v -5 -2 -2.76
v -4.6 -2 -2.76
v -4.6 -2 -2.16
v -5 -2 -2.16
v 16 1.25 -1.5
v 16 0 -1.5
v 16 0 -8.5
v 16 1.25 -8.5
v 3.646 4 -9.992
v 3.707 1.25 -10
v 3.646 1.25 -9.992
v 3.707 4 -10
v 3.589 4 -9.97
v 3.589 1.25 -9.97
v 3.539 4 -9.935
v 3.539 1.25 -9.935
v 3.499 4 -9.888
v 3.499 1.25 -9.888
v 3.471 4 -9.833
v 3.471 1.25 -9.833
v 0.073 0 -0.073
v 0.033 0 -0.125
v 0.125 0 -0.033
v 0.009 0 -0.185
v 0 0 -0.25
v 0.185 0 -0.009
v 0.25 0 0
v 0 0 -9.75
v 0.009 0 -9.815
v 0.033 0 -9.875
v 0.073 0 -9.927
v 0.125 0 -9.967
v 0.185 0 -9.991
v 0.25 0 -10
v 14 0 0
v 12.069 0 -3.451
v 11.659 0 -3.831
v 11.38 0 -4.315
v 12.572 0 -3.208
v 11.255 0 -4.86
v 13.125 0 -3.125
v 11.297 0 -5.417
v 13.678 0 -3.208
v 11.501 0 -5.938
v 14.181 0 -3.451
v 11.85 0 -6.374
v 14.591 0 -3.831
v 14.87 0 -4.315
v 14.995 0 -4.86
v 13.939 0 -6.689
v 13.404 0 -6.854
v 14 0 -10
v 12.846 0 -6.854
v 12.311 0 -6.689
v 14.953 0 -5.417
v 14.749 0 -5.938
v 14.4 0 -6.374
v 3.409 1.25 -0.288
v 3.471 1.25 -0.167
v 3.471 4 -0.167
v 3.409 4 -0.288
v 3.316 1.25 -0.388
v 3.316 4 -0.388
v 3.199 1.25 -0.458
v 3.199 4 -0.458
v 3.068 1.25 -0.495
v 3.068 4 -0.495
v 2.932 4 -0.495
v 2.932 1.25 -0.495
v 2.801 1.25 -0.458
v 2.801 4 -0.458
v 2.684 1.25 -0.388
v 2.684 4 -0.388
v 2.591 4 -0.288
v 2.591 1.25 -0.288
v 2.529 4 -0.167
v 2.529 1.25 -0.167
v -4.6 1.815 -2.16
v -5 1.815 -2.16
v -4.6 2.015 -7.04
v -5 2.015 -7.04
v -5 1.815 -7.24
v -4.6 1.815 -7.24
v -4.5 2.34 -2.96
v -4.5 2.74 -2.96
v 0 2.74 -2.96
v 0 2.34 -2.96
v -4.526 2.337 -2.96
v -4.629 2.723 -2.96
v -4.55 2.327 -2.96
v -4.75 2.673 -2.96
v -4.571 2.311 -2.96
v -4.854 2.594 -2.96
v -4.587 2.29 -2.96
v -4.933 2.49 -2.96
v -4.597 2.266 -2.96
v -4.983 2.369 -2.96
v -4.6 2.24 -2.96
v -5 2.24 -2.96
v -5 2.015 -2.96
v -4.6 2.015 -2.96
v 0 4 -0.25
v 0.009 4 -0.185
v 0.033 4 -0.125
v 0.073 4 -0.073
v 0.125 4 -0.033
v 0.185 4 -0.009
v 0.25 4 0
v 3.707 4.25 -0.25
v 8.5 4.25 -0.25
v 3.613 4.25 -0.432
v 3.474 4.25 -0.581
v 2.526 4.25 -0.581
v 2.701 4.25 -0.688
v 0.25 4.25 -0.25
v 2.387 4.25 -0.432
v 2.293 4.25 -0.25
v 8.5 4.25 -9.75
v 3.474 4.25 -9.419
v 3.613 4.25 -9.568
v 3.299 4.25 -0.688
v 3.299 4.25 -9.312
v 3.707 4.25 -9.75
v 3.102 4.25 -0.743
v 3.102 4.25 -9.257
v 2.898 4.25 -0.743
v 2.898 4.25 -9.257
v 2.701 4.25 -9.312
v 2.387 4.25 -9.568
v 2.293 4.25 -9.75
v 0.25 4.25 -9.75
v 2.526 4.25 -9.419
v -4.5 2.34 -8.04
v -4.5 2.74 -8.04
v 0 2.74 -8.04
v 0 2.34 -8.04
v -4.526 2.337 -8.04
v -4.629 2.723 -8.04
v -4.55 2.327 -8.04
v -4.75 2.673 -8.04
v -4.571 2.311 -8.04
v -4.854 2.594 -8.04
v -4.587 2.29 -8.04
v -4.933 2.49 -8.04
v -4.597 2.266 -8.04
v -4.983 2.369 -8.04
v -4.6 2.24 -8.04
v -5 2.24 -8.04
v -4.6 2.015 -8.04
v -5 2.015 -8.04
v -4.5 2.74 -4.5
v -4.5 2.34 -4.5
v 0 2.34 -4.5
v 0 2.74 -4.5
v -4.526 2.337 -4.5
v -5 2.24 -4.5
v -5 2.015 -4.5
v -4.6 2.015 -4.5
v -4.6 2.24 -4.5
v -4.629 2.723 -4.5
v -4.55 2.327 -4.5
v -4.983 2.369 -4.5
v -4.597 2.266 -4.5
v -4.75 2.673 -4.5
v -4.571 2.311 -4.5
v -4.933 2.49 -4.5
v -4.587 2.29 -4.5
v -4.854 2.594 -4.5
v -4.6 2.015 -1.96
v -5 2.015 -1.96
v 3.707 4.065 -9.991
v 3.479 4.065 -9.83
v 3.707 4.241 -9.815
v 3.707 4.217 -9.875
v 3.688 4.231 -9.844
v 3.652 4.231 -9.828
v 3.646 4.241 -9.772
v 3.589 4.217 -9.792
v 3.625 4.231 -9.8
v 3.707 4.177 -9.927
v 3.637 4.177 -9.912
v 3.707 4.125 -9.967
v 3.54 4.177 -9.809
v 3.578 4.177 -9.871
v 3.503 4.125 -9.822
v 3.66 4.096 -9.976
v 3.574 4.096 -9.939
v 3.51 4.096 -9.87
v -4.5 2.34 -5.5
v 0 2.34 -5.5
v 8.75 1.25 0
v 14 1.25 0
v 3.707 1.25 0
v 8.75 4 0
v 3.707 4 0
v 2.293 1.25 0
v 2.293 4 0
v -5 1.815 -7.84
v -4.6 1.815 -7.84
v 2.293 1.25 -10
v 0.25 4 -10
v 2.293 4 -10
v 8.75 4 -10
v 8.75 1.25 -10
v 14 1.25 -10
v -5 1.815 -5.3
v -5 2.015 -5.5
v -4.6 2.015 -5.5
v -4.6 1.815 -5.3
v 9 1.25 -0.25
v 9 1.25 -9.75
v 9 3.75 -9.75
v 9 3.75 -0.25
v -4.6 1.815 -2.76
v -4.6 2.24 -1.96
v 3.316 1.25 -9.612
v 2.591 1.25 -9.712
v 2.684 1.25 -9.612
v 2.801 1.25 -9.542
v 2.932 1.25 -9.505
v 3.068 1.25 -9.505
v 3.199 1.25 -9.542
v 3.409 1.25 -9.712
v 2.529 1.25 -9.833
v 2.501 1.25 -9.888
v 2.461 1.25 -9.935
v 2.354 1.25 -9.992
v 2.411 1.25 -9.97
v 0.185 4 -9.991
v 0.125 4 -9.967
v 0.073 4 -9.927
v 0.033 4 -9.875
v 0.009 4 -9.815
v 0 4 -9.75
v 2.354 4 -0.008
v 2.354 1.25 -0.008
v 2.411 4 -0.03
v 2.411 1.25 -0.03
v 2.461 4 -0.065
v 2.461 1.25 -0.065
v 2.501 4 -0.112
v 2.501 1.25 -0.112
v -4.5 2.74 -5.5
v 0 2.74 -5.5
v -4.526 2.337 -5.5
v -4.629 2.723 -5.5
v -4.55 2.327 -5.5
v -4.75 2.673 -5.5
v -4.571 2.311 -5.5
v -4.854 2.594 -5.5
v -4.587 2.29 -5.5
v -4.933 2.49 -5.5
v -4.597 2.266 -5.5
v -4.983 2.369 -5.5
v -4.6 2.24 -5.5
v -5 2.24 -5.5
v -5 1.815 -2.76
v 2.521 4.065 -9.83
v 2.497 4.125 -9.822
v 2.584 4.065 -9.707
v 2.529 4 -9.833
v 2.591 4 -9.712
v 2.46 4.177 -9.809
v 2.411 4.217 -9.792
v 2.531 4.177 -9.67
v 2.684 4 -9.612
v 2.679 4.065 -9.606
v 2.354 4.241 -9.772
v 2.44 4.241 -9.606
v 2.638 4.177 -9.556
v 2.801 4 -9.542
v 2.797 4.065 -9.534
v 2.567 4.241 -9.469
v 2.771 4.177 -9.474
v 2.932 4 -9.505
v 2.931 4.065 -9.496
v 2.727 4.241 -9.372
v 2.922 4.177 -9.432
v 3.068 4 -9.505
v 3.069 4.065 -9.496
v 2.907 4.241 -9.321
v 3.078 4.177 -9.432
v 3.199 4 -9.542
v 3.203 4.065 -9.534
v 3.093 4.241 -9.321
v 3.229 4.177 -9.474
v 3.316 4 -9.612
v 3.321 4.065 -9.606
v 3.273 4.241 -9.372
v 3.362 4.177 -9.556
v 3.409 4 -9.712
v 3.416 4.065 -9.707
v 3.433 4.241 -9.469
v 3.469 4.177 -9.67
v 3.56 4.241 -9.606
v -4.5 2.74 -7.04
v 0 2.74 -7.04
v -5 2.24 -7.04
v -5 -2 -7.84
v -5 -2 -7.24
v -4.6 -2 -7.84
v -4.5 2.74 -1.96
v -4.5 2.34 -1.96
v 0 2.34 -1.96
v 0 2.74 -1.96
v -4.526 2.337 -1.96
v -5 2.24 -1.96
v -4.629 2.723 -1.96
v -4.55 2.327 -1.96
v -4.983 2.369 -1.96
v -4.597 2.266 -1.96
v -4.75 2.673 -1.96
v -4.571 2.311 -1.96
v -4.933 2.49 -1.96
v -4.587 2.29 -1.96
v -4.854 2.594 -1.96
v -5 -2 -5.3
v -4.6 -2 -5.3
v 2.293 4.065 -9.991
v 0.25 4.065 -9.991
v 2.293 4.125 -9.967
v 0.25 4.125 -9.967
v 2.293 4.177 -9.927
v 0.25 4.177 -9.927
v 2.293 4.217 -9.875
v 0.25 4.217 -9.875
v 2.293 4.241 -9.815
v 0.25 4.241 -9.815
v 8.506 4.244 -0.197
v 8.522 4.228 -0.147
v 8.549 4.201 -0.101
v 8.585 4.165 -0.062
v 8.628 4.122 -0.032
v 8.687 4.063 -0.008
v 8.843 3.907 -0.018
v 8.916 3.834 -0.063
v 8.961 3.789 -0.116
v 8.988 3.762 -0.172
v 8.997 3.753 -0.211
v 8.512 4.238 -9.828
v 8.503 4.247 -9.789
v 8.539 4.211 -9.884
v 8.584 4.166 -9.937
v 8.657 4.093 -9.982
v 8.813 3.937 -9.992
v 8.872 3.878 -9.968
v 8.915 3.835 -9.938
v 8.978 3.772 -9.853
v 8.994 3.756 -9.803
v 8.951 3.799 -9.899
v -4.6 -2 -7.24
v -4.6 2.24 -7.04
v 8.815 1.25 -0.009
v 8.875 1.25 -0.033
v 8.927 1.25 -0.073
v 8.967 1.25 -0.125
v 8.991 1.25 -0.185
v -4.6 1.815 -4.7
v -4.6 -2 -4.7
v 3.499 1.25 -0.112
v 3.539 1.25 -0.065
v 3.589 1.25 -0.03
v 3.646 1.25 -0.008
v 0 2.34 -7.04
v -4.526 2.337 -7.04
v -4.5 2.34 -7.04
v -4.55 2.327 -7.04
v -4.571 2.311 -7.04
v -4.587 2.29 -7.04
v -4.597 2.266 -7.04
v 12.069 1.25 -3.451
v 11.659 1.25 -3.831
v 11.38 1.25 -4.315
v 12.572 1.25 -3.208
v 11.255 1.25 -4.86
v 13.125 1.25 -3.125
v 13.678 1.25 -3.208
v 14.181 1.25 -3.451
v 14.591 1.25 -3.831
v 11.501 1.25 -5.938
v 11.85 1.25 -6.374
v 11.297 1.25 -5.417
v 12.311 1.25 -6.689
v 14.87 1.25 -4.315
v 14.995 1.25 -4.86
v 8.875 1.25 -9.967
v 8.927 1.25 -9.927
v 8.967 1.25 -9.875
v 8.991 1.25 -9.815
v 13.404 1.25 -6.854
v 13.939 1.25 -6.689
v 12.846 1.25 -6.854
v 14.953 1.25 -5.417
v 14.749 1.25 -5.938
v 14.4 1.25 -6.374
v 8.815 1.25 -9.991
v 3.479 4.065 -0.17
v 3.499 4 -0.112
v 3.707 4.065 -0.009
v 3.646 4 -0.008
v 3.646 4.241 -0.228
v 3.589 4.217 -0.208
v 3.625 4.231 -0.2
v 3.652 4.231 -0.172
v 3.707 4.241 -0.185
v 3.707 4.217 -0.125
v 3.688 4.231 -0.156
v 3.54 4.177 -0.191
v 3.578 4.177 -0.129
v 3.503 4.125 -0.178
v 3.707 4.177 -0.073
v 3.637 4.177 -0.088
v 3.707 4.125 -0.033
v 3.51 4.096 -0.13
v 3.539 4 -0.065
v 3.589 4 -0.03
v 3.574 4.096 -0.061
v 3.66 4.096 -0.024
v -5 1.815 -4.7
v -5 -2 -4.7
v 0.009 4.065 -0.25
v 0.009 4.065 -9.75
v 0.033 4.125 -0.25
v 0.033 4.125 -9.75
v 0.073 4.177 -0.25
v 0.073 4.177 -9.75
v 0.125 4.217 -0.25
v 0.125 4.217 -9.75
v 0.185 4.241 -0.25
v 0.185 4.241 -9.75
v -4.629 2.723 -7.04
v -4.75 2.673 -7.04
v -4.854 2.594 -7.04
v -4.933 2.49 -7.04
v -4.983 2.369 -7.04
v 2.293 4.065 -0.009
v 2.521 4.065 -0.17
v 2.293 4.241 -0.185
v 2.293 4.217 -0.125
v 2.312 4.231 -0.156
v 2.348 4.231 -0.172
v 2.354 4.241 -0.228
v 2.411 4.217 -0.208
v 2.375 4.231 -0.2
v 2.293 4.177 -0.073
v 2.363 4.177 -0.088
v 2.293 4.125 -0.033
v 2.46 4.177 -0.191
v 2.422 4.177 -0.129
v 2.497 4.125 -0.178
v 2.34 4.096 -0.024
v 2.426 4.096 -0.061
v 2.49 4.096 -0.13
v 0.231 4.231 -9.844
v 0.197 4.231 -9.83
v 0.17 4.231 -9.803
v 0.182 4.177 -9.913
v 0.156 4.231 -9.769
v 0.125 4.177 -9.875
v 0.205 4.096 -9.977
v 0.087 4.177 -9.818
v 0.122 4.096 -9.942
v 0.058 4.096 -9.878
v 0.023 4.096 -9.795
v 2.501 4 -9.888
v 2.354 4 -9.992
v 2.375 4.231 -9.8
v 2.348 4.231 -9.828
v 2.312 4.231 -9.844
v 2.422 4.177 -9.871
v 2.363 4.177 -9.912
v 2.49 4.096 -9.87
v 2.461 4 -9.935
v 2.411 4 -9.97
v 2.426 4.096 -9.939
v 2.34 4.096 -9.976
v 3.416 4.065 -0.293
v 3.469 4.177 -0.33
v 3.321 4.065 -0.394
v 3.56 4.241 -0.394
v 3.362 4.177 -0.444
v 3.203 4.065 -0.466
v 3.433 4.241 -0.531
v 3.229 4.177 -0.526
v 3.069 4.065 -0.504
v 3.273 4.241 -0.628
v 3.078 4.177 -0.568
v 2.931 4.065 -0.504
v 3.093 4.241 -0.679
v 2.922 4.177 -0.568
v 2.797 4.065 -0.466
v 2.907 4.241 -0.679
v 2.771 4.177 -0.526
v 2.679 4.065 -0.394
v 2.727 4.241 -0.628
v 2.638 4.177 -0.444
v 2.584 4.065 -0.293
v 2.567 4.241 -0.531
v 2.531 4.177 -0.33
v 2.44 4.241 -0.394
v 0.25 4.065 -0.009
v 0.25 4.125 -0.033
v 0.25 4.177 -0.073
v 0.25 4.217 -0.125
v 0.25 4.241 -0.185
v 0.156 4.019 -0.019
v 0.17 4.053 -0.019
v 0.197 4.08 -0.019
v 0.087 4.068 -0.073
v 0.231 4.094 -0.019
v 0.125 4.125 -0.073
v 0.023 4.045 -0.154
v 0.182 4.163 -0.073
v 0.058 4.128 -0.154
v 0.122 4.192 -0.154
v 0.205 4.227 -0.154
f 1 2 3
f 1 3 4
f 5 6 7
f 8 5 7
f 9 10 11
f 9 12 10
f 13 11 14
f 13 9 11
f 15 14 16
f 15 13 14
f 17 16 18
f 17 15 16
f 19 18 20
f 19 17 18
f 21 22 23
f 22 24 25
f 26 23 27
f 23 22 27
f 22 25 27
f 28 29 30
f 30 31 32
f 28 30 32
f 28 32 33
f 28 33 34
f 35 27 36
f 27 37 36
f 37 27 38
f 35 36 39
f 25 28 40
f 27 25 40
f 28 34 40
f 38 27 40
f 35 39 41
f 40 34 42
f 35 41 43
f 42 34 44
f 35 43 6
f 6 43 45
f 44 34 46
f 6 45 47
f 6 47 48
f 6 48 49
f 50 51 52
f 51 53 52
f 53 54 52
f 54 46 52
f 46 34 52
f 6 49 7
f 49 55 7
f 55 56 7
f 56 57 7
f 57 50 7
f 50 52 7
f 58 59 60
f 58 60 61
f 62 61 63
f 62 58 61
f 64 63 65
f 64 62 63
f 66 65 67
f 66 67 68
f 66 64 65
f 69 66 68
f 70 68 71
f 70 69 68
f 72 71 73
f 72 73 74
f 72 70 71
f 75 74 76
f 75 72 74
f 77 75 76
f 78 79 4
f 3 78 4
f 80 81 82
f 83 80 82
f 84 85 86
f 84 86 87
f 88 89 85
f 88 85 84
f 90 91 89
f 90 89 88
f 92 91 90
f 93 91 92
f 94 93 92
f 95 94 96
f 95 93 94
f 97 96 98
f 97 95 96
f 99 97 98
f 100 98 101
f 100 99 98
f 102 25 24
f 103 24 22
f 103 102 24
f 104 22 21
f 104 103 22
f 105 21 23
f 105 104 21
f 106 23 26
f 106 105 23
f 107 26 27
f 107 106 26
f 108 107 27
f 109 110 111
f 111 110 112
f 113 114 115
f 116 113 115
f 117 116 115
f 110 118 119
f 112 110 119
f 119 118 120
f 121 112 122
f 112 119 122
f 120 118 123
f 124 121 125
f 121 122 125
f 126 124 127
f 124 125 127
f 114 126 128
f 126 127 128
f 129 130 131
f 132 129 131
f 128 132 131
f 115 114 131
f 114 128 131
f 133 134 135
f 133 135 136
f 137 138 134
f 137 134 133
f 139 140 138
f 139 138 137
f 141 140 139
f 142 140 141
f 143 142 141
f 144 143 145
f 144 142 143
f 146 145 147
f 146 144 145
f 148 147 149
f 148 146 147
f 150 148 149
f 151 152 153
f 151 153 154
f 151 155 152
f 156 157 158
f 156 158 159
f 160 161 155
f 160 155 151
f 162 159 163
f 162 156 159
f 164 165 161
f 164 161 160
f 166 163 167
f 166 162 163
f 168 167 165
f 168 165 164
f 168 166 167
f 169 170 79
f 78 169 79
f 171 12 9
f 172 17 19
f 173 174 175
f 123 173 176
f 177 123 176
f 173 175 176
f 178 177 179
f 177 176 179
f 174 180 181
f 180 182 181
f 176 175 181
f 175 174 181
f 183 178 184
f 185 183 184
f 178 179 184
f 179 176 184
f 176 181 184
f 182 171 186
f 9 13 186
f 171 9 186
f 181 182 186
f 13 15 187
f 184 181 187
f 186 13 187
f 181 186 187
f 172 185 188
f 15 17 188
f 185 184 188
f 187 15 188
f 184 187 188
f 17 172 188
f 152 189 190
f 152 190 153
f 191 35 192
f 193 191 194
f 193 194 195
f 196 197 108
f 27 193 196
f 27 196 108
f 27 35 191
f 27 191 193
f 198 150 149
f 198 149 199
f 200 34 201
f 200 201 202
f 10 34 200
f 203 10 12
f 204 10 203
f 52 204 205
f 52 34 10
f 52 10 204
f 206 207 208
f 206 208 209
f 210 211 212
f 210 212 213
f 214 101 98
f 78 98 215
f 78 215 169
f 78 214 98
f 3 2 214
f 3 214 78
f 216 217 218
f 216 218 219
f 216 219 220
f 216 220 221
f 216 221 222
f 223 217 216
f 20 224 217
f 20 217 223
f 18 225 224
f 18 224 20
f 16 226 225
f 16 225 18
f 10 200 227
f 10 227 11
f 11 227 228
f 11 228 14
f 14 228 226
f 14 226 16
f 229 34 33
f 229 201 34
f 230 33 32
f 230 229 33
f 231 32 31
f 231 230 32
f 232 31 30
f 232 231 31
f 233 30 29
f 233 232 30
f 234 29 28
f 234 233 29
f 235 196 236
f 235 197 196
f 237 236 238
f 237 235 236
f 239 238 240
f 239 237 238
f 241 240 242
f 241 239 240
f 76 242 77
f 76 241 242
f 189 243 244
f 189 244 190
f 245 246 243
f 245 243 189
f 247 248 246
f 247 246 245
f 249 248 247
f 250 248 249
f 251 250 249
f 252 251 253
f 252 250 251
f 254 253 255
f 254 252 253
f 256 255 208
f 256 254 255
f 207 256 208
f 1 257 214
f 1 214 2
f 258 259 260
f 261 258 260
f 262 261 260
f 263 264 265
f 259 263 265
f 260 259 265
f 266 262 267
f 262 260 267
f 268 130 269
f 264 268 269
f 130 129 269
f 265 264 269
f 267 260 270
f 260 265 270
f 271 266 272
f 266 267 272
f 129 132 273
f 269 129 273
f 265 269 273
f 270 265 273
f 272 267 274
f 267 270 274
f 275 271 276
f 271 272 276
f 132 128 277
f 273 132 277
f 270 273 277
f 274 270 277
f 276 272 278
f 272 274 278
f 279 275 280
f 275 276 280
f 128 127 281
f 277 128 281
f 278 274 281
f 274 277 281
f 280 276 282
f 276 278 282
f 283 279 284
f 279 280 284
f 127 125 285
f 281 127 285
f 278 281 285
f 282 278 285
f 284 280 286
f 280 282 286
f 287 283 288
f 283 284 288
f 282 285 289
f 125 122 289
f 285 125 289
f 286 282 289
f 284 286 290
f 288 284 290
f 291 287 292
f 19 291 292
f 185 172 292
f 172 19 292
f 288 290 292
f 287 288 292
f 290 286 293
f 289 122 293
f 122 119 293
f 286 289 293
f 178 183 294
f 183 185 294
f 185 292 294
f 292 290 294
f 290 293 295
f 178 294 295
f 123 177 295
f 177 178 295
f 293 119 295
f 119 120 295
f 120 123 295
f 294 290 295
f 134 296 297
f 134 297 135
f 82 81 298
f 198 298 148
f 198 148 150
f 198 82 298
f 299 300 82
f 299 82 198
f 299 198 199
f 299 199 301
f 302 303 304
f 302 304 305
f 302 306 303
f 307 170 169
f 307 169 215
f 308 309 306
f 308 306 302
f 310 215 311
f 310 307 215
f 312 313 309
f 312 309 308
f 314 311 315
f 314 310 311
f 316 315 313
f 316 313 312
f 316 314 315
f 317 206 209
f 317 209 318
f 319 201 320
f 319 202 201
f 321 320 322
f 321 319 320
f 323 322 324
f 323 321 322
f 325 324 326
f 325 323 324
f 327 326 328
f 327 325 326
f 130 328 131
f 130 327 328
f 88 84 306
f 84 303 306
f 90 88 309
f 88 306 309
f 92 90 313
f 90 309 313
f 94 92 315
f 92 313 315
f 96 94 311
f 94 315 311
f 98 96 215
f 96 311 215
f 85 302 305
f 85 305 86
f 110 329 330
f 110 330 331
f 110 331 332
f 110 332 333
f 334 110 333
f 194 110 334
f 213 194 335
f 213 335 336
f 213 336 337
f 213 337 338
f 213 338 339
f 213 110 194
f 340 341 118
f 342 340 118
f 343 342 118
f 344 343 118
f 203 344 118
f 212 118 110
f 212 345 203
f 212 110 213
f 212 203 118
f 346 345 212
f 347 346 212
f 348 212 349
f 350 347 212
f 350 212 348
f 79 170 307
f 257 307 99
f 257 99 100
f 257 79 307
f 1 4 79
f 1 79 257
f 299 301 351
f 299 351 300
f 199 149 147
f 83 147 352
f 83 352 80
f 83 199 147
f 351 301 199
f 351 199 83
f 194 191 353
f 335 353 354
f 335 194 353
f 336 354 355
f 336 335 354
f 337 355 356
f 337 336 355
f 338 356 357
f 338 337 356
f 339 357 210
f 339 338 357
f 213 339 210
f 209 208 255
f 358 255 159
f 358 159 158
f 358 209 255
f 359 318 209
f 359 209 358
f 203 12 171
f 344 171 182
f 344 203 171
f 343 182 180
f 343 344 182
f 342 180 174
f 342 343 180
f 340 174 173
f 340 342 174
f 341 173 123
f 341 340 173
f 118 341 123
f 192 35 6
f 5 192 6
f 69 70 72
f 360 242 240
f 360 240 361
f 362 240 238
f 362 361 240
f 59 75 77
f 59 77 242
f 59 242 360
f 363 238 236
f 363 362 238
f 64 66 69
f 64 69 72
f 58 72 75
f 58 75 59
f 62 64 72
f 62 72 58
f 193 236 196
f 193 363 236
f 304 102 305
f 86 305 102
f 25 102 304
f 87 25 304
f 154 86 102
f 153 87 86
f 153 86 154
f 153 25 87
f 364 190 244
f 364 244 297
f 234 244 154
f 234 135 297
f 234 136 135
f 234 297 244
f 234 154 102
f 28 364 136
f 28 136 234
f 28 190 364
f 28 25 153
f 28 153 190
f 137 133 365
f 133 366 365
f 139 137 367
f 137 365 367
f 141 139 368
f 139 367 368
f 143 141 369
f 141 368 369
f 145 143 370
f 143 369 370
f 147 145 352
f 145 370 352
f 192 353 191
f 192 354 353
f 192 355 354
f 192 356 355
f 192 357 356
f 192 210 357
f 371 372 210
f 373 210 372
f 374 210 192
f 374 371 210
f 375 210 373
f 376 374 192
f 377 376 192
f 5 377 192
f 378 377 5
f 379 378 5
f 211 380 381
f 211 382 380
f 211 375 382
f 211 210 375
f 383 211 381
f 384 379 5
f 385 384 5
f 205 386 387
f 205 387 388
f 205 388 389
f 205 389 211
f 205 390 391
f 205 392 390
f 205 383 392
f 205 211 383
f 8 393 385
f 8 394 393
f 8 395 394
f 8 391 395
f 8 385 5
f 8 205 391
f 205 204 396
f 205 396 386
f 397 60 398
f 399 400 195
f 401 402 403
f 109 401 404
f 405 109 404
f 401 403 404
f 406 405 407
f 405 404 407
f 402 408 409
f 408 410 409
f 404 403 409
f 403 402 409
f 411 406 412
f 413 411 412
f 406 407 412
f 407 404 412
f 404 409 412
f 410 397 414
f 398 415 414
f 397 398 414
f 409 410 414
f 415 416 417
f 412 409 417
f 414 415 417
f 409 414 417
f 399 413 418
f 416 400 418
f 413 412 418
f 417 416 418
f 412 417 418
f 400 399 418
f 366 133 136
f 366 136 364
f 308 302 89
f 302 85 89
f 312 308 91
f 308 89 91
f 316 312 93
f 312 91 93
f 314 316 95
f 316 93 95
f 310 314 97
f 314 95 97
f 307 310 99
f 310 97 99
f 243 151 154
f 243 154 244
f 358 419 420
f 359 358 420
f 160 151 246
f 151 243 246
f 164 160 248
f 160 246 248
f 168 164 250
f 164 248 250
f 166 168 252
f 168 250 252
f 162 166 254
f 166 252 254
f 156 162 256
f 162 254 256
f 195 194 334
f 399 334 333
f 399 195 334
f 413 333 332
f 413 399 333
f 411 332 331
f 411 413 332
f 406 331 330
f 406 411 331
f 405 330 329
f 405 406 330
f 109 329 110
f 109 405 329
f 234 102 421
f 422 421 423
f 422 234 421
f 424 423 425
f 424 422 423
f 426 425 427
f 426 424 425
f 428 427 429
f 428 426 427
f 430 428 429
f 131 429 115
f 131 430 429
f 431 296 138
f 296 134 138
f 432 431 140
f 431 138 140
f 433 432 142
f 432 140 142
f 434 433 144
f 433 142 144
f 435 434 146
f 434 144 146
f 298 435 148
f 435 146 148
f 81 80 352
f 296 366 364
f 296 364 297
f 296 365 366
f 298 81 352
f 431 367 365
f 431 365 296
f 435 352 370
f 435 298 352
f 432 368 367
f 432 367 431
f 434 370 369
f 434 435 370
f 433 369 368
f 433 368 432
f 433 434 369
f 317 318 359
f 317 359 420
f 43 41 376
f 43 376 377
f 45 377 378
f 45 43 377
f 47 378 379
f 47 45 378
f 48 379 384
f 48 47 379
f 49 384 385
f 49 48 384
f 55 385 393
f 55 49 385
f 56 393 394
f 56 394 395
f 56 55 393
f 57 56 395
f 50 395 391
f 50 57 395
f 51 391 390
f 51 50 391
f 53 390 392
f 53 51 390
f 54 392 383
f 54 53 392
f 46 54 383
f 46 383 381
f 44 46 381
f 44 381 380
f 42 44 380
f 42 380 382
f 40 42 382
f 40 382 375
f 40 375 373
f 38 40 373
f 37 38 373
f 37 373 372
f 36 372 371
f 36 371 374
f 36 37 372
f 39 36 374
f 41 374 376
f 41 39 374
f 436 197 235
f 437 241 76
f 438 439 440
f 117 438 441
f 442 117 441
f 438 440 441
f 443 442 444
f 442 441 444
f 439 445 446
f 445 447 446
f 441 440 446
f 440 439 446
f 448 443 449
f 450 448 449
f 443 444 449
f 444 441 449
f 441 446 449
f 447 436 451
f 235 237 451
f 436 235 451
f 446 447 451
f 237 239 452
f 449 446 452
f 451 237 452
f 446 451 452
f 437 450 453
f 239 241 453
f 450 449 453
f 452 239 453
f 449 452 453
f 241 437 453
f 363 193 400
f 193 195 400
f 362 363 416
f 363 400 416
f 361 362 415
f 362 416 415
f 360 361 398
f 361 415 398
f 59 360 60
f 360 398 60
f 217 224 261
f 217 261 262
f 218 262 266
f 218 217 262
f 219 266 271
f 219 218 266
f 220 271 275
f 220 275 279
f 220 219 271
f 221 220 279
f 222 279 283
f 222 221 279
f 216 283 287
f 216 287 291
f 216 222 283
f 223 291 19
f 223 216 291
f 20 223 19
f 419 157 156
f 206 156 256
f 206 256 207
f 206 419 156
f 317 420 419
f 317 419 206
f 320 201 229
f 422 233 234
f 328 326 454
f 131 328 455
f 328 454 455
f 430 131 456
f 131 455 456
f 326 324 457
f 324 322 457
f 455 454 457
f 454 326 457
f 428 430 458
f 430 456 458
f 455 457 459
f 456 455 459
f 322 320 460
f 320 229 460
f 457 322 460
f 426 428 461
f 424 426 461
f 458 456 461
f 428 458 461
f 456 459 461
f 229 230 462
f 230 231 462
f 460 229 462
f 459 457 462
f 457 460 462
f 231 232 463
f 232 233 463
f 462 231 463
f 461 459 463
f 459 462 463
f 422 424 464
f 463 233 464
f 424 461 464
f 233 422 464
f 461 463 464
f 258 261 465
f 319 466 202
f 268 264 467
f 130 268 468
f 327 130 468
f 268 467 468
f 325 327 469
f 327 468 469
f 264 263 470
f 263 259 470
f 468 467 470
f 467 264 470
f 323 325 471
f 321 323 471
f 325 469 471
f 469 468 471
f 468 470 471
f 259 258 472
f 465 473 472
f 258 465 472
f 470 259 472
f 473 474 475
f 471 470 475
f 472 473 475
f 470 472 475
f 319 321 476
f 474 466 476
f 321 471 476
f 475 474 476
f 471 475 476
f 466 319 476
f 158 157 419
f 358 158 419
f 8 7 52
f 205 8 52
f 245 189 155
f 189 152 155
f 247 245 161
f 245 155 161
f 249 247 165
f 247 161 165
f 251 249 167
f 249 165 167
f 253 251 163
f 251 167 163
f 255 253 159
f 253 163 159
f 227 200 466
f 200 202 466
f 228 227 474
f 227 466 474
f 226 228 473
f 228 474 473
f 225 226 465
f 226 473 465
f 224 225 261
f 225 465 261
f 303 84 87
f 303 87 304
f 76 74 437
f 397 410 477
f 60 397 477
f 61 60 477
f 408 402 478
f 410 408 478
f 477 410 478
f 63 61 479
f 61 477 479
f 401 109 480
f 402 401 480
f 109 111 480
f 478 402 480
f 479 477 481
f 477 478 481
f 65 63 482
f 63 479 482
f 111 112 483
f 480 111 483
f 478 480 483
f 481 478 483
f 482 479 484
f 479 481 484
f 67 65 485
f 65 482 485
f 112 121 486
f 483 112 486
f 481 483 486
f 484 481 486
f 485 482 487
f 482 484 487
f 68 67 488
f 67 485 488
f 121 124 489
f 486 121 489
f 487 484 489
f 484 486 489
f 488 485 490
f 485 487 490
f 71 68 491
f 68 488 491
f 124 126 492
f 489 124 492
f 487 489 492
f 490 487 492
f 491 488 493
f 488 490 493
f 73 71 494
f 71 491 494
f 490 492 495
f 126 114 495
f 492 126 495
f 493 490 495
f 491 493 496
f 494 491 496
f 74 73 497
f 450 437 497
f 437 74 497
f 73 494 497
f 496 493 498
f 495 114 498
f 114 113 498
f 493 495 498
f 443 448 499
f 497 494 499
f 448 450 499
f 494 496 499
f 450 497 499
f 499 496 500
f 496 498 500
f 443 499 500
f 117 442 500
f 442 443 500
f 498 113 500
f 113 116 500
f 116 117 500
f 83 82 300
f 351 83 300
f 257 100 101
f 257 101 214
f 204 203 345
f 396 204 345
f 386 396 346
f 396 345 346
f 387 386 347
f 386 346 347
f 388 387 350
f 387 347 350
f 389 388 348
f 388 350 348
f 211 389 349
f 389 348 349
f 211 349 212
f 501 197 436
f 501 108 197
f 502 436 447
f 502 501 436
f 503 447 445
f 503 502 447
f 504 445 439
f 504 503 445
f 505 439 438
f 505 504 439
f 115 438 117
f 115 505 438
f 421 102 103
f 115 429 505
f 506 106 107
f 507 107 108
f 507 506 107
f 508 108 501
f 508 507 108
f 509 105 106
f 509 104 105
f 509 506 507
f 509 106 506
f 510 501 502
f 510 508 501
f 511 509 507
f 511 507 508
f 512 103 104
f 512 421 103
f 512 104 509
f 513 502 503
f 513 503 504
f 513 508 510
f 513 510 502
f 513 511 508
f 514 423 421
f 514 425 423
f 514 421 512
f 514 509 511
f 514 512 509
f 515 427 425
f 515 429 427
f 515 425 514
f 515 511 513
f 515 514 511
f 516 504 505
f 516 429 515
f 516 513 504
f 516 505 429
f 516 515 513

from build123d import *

# Parameters (mm, degrees)
SKETCH_1_R               = 1.875
EXTRUDE_1_DEPTH          = 1.25
EXTRUDE_2_DEPTH          = 3
FILLET_1_R               = 0.25
CHAMFER_1_SIZE           = 0.5
SKETCH_3_W               = 0.999690432
SKETCH_3_H               = 0.4
CUT_EXTRUDE_1_REACH      = 25.645
PATTERN_LINEAR_1_COUNT   = 2
PATTERN_LINEAR_1_PITCH   = 2.54
MIRROR_1_COPY_1_SKETCH_W = 0.999690432
MIRROR_1_COPY_1_SKETCH_H = 0.4
MIRROR_1_COPY_2_REACH    = 25.645


with BuildPart() as part:
    # 草图1 → 凸台-拉伸1 (new body)
    with BuildSketch(Plane(origin=(0, 0, 0), x_dir=(1, 0, 0), z_dir=(0, 1, 0))):
        Polygon((0, 0), (14, 0), (16, 1.5), (16, 8.5), (14, 10), (0, 10), align=None)
        with Locations(Location((13.125, 5, 0), (0, 0, 270))):
            Circle(SKETCH_1_R, mode=Mode.SUBTRACT)
    extrude(amount=EXTRUDE_1_DEPTH)

    # 草图2 → 凸台-拉伸2 (add)
    with BuildSketch(Plane(origin=(0, 1.25, 0), x_dir=(1, 0, 0), z_dir=(0, 1, 0))):
        with BuildLine():
            Line((0, 10), (2.5, 10))
            ThreePointArc((2.5, 10), (3, 9.5), (3.5, 10))
            Line((3.5, 10), (9, 10))
            Line((9, 10), (9, 0))
            Line((9, 0), (3.5, 0))
            ThreePointArc((3.5, 0), (3, 0.5), (2.5, 0))
            Line((2.5, 0), (0, 0))
            Line((0, 0), (0, 10))
        make_face()
    extrude(amount=EXTRUDE_2_DEPTH)

    # 圆角1
    fillet_1_edges = [part.edges().sort_by_distance(p)[0] for p in [
        (0, 2.125, -10),
        (2.5, 2.75, -10),
        (3.5, 2.75, -10),
        (6.25, 4.25, -10),
        (3, 4.25, -9.5),
        (1.25, 4.25, -10),
        (0, 4.25, -5),
        (0, 2.125, 0),
        (3.5, 2.75, 0),
        (2.5, 2.75, 0),
        (1.25, 4.25, 0),
        (3, 4.25, -0.5),
        (6.25, 4.25, 0),
        (9, 2.75, -10),
        (9, 2.75, 0),
    ]]
    fillet(fillet_1_edges, radius=FILLET_1_R)

    # 倒角1
    # the kernel refuses this chamfer: 0.5 mm, written as the material it takes off along each edge
    with BuildSketch(Plane(origin=(9, 4.25, -11.035841494), x_dir=(-0.9996219169112968, 0.027495876610585647, 0), z_dir=(0, 0, 1))) as chamfer_1_piece_1:
        Polygon((CHAMFER_1_SIZE * 0.999621916911, CHAMFER_1_SIZE * 0.0274958766106), (-CHAMFER_1_SIZE * 0.0274958766106, CHAMFER_1_SIZE * 0.999621916911), (0, 0), align=None)
    extrude(amount=12.071682988, mode=Mode.SUBTRACT)

    # 扫描1: sweep along a path in 草图4
    with BuildLine(Plane(origin=(0, 0, -5), x_dir=(-1, 0, 0), z_dir=(0, 0, -1))) as sweep_1_path:
        Line((0, 2.74), (4.5, 2.74))
        ThreePointArc((4.5, 2.74), (4.853553391, 2.593553391), (5, 2.24))
        Line((5, 2.24), (5, -2))
    # 草图3 → 扫描1 (sweep)
    with BuildSketch(Plane.ZY):
        with Locations((-5, 2.54)):
            Rectangle(SKETCH_3_W, SKETCH_3_H)
    sweep_1 = sweep(path=sweep_1_path.line)

    # 草图5 → 切除-拉伸1 (cut, up to next)
    with BuildSketch(Plane.ZY.offset(5), mode=Mode.PRIVATE) as cut_extrude_1_sk1:
        Polygon((-4.7, 1.814659855), (-4.7, -2), (-4.500154784, -2), (-4.500154784, 2.014505072), align=None)
    cut_extrude_1_tool1 = extrude(cut_extrude_1_sk1.sketch, amount=-CUT_EXTRUDE_1_REACH, mode=Mode.PRIVATE) & part.part
    # 草图5 → 切除-拉伸1 (cut, up to next)
    with BuildSketch(Plane.ZY.offset(5), mode=Mode.PRIVATE) as cut_extrude_1_sk2:
        Polygon((-5.3, 1.814659855), (-5.3, -2), (-5.499845216, -2), (-5.499845216, 2.014505072), align=None)
    cut_extrude_1_tool2 = extrude(cut_extrude_1_sk2.sketch, amount=-CUT_EXTRUDE_1_REACH, mode=Mode.PRIVATE) & part.part
    cut_extrude_1_1 = cut_extrude_1_tool1.solids().sort_by_distance((-5, -0.042284, -4.599227))[0]
    add(cut_extrude_1_1, mode=Mode.SUBTRACT)
    cut_extrude_1_2 = cut_extrude_1_tool2.solids().sort_by_distance((-5, -0.042284, -5.400773))[0]
    add(cut_extrude_1_2, mode=Mode.SUBTRACT)
    cut_extrude_1 = cut_extrude_1_1 + cut_extrude_1_2  # 切除-拉伸1 as one shape, for the pattern or mirror that repeats it

    # 阵列(线性)1: 扫描1, 切除-拉伸1 ×2
    with Locations(*[(0, 0, i * PATTERN_LINEAR_1_PITCH) for i in range(1, PATTERN_LINEAR_1_COUNT)]):
        add(sweep_1)
        add(cut_extrude_1, mode=Mode.SUBTRACT)

    # 镜向1: 扫描1, 切除-拉伸1 across plane
    add(sweep_1.mirror(Plane(origin=(0, 0, -5), x_dir=(1, 0, 0), z_dir=(0, 0, -1))))
    add(cut_extrude_1.mirror(Plane(origin=(0, 0, -5), x_dir=(1, 0, 0), z_dir=(0, 0, -1))), mode=Mode.SUBTRACT)

    # 镜向1 copy 1: sweep along a path in 镜向1 copy 1 path
    with BuildLine(Plane(origin=(0, 0, -7.54), x_dir=(-1, 0, 0), z_dir=(0, 0, 1))) as mirror_1_copy_1_path:
        Line((0, -2.74), (4.5, -2.74))
        ThreePointArc((4.5, -2.74), (4.853553391, -2.593553391), (5, -2.24))
        Line((5, -2.24), (5, 2))
    # 镜向1 copy 1 sketch → 镜向1 copy 1 (sweep)
    with BuildSketch(Plane(origin=(0, 0, -12.54), x_dir=(0, 0, -1), z_dir=(-1, 0, 0))):
        with Locations((-5, -2.54)):
            Rectangle(MIRROR_1_COPY_1_SKETCH_W, MIRROR_1_COPY_1_SKETCH_H)
    sweep(path=mirror_1_copy_1_path.line)

    # 镜向1 copy 2 sketch → 镜向1 copy 2 (cut, up to next)
    with BuildSketch(Plane(origin=(-5, 0, -12.54), x_dir=(0, 0, -1), z_dir=(-1, 0, 0)), mode=Mode.PRIVATE) as mirror_1_copy_2_sk1:
        Polygon((-4.7, -1.814659855), (-4.7, 2), (-4.500154784, 2), (-4.500154784, -2.014505072), align=None)
    mirror_1_copy_2_tool1 = extrude(mirror_1_copy_2_sk1.sketch, amount=-MIRROR_1_COPY_2_REACH, mode=Mode.PRIVATE) & part.part
    # 镜向1 copy 2 sketch → 镜向1 copy 2 (cut, up to next)
    with BuildSketch(Plane(origin=(-5, 0, -12.54), x_dir=(0, 0, -1), z_dir=(-1, 0, 0)), mode=Mode.PRIVATE) as mirror_1_copy_2_sk2:
        Polygon((-5.3, -1.814659855), (-5.3, 2), (-5.499845216, 2), (-5.499845216, -2.014505072), align=None)
    mirror_1_copy_2_tool2 = extrude(mirror_1_copy_2_sk2.sketch, amount=-MIRROR_1_COPY_2_REACH, mode=Mode.PRIVATE) & part.part
    add(mirror_1_copy_2_tool1.solids().sort_by_distance((-5, -0.042284, -7.940773))[0], mode=Mode.SUBTRACT)
    add(mirror_1_copy_2_tool2.solids().sort_by_distance((-5, -0.042284, -7.139227))[0], mode=Mode.SUBTRACT)


solid = part.part
